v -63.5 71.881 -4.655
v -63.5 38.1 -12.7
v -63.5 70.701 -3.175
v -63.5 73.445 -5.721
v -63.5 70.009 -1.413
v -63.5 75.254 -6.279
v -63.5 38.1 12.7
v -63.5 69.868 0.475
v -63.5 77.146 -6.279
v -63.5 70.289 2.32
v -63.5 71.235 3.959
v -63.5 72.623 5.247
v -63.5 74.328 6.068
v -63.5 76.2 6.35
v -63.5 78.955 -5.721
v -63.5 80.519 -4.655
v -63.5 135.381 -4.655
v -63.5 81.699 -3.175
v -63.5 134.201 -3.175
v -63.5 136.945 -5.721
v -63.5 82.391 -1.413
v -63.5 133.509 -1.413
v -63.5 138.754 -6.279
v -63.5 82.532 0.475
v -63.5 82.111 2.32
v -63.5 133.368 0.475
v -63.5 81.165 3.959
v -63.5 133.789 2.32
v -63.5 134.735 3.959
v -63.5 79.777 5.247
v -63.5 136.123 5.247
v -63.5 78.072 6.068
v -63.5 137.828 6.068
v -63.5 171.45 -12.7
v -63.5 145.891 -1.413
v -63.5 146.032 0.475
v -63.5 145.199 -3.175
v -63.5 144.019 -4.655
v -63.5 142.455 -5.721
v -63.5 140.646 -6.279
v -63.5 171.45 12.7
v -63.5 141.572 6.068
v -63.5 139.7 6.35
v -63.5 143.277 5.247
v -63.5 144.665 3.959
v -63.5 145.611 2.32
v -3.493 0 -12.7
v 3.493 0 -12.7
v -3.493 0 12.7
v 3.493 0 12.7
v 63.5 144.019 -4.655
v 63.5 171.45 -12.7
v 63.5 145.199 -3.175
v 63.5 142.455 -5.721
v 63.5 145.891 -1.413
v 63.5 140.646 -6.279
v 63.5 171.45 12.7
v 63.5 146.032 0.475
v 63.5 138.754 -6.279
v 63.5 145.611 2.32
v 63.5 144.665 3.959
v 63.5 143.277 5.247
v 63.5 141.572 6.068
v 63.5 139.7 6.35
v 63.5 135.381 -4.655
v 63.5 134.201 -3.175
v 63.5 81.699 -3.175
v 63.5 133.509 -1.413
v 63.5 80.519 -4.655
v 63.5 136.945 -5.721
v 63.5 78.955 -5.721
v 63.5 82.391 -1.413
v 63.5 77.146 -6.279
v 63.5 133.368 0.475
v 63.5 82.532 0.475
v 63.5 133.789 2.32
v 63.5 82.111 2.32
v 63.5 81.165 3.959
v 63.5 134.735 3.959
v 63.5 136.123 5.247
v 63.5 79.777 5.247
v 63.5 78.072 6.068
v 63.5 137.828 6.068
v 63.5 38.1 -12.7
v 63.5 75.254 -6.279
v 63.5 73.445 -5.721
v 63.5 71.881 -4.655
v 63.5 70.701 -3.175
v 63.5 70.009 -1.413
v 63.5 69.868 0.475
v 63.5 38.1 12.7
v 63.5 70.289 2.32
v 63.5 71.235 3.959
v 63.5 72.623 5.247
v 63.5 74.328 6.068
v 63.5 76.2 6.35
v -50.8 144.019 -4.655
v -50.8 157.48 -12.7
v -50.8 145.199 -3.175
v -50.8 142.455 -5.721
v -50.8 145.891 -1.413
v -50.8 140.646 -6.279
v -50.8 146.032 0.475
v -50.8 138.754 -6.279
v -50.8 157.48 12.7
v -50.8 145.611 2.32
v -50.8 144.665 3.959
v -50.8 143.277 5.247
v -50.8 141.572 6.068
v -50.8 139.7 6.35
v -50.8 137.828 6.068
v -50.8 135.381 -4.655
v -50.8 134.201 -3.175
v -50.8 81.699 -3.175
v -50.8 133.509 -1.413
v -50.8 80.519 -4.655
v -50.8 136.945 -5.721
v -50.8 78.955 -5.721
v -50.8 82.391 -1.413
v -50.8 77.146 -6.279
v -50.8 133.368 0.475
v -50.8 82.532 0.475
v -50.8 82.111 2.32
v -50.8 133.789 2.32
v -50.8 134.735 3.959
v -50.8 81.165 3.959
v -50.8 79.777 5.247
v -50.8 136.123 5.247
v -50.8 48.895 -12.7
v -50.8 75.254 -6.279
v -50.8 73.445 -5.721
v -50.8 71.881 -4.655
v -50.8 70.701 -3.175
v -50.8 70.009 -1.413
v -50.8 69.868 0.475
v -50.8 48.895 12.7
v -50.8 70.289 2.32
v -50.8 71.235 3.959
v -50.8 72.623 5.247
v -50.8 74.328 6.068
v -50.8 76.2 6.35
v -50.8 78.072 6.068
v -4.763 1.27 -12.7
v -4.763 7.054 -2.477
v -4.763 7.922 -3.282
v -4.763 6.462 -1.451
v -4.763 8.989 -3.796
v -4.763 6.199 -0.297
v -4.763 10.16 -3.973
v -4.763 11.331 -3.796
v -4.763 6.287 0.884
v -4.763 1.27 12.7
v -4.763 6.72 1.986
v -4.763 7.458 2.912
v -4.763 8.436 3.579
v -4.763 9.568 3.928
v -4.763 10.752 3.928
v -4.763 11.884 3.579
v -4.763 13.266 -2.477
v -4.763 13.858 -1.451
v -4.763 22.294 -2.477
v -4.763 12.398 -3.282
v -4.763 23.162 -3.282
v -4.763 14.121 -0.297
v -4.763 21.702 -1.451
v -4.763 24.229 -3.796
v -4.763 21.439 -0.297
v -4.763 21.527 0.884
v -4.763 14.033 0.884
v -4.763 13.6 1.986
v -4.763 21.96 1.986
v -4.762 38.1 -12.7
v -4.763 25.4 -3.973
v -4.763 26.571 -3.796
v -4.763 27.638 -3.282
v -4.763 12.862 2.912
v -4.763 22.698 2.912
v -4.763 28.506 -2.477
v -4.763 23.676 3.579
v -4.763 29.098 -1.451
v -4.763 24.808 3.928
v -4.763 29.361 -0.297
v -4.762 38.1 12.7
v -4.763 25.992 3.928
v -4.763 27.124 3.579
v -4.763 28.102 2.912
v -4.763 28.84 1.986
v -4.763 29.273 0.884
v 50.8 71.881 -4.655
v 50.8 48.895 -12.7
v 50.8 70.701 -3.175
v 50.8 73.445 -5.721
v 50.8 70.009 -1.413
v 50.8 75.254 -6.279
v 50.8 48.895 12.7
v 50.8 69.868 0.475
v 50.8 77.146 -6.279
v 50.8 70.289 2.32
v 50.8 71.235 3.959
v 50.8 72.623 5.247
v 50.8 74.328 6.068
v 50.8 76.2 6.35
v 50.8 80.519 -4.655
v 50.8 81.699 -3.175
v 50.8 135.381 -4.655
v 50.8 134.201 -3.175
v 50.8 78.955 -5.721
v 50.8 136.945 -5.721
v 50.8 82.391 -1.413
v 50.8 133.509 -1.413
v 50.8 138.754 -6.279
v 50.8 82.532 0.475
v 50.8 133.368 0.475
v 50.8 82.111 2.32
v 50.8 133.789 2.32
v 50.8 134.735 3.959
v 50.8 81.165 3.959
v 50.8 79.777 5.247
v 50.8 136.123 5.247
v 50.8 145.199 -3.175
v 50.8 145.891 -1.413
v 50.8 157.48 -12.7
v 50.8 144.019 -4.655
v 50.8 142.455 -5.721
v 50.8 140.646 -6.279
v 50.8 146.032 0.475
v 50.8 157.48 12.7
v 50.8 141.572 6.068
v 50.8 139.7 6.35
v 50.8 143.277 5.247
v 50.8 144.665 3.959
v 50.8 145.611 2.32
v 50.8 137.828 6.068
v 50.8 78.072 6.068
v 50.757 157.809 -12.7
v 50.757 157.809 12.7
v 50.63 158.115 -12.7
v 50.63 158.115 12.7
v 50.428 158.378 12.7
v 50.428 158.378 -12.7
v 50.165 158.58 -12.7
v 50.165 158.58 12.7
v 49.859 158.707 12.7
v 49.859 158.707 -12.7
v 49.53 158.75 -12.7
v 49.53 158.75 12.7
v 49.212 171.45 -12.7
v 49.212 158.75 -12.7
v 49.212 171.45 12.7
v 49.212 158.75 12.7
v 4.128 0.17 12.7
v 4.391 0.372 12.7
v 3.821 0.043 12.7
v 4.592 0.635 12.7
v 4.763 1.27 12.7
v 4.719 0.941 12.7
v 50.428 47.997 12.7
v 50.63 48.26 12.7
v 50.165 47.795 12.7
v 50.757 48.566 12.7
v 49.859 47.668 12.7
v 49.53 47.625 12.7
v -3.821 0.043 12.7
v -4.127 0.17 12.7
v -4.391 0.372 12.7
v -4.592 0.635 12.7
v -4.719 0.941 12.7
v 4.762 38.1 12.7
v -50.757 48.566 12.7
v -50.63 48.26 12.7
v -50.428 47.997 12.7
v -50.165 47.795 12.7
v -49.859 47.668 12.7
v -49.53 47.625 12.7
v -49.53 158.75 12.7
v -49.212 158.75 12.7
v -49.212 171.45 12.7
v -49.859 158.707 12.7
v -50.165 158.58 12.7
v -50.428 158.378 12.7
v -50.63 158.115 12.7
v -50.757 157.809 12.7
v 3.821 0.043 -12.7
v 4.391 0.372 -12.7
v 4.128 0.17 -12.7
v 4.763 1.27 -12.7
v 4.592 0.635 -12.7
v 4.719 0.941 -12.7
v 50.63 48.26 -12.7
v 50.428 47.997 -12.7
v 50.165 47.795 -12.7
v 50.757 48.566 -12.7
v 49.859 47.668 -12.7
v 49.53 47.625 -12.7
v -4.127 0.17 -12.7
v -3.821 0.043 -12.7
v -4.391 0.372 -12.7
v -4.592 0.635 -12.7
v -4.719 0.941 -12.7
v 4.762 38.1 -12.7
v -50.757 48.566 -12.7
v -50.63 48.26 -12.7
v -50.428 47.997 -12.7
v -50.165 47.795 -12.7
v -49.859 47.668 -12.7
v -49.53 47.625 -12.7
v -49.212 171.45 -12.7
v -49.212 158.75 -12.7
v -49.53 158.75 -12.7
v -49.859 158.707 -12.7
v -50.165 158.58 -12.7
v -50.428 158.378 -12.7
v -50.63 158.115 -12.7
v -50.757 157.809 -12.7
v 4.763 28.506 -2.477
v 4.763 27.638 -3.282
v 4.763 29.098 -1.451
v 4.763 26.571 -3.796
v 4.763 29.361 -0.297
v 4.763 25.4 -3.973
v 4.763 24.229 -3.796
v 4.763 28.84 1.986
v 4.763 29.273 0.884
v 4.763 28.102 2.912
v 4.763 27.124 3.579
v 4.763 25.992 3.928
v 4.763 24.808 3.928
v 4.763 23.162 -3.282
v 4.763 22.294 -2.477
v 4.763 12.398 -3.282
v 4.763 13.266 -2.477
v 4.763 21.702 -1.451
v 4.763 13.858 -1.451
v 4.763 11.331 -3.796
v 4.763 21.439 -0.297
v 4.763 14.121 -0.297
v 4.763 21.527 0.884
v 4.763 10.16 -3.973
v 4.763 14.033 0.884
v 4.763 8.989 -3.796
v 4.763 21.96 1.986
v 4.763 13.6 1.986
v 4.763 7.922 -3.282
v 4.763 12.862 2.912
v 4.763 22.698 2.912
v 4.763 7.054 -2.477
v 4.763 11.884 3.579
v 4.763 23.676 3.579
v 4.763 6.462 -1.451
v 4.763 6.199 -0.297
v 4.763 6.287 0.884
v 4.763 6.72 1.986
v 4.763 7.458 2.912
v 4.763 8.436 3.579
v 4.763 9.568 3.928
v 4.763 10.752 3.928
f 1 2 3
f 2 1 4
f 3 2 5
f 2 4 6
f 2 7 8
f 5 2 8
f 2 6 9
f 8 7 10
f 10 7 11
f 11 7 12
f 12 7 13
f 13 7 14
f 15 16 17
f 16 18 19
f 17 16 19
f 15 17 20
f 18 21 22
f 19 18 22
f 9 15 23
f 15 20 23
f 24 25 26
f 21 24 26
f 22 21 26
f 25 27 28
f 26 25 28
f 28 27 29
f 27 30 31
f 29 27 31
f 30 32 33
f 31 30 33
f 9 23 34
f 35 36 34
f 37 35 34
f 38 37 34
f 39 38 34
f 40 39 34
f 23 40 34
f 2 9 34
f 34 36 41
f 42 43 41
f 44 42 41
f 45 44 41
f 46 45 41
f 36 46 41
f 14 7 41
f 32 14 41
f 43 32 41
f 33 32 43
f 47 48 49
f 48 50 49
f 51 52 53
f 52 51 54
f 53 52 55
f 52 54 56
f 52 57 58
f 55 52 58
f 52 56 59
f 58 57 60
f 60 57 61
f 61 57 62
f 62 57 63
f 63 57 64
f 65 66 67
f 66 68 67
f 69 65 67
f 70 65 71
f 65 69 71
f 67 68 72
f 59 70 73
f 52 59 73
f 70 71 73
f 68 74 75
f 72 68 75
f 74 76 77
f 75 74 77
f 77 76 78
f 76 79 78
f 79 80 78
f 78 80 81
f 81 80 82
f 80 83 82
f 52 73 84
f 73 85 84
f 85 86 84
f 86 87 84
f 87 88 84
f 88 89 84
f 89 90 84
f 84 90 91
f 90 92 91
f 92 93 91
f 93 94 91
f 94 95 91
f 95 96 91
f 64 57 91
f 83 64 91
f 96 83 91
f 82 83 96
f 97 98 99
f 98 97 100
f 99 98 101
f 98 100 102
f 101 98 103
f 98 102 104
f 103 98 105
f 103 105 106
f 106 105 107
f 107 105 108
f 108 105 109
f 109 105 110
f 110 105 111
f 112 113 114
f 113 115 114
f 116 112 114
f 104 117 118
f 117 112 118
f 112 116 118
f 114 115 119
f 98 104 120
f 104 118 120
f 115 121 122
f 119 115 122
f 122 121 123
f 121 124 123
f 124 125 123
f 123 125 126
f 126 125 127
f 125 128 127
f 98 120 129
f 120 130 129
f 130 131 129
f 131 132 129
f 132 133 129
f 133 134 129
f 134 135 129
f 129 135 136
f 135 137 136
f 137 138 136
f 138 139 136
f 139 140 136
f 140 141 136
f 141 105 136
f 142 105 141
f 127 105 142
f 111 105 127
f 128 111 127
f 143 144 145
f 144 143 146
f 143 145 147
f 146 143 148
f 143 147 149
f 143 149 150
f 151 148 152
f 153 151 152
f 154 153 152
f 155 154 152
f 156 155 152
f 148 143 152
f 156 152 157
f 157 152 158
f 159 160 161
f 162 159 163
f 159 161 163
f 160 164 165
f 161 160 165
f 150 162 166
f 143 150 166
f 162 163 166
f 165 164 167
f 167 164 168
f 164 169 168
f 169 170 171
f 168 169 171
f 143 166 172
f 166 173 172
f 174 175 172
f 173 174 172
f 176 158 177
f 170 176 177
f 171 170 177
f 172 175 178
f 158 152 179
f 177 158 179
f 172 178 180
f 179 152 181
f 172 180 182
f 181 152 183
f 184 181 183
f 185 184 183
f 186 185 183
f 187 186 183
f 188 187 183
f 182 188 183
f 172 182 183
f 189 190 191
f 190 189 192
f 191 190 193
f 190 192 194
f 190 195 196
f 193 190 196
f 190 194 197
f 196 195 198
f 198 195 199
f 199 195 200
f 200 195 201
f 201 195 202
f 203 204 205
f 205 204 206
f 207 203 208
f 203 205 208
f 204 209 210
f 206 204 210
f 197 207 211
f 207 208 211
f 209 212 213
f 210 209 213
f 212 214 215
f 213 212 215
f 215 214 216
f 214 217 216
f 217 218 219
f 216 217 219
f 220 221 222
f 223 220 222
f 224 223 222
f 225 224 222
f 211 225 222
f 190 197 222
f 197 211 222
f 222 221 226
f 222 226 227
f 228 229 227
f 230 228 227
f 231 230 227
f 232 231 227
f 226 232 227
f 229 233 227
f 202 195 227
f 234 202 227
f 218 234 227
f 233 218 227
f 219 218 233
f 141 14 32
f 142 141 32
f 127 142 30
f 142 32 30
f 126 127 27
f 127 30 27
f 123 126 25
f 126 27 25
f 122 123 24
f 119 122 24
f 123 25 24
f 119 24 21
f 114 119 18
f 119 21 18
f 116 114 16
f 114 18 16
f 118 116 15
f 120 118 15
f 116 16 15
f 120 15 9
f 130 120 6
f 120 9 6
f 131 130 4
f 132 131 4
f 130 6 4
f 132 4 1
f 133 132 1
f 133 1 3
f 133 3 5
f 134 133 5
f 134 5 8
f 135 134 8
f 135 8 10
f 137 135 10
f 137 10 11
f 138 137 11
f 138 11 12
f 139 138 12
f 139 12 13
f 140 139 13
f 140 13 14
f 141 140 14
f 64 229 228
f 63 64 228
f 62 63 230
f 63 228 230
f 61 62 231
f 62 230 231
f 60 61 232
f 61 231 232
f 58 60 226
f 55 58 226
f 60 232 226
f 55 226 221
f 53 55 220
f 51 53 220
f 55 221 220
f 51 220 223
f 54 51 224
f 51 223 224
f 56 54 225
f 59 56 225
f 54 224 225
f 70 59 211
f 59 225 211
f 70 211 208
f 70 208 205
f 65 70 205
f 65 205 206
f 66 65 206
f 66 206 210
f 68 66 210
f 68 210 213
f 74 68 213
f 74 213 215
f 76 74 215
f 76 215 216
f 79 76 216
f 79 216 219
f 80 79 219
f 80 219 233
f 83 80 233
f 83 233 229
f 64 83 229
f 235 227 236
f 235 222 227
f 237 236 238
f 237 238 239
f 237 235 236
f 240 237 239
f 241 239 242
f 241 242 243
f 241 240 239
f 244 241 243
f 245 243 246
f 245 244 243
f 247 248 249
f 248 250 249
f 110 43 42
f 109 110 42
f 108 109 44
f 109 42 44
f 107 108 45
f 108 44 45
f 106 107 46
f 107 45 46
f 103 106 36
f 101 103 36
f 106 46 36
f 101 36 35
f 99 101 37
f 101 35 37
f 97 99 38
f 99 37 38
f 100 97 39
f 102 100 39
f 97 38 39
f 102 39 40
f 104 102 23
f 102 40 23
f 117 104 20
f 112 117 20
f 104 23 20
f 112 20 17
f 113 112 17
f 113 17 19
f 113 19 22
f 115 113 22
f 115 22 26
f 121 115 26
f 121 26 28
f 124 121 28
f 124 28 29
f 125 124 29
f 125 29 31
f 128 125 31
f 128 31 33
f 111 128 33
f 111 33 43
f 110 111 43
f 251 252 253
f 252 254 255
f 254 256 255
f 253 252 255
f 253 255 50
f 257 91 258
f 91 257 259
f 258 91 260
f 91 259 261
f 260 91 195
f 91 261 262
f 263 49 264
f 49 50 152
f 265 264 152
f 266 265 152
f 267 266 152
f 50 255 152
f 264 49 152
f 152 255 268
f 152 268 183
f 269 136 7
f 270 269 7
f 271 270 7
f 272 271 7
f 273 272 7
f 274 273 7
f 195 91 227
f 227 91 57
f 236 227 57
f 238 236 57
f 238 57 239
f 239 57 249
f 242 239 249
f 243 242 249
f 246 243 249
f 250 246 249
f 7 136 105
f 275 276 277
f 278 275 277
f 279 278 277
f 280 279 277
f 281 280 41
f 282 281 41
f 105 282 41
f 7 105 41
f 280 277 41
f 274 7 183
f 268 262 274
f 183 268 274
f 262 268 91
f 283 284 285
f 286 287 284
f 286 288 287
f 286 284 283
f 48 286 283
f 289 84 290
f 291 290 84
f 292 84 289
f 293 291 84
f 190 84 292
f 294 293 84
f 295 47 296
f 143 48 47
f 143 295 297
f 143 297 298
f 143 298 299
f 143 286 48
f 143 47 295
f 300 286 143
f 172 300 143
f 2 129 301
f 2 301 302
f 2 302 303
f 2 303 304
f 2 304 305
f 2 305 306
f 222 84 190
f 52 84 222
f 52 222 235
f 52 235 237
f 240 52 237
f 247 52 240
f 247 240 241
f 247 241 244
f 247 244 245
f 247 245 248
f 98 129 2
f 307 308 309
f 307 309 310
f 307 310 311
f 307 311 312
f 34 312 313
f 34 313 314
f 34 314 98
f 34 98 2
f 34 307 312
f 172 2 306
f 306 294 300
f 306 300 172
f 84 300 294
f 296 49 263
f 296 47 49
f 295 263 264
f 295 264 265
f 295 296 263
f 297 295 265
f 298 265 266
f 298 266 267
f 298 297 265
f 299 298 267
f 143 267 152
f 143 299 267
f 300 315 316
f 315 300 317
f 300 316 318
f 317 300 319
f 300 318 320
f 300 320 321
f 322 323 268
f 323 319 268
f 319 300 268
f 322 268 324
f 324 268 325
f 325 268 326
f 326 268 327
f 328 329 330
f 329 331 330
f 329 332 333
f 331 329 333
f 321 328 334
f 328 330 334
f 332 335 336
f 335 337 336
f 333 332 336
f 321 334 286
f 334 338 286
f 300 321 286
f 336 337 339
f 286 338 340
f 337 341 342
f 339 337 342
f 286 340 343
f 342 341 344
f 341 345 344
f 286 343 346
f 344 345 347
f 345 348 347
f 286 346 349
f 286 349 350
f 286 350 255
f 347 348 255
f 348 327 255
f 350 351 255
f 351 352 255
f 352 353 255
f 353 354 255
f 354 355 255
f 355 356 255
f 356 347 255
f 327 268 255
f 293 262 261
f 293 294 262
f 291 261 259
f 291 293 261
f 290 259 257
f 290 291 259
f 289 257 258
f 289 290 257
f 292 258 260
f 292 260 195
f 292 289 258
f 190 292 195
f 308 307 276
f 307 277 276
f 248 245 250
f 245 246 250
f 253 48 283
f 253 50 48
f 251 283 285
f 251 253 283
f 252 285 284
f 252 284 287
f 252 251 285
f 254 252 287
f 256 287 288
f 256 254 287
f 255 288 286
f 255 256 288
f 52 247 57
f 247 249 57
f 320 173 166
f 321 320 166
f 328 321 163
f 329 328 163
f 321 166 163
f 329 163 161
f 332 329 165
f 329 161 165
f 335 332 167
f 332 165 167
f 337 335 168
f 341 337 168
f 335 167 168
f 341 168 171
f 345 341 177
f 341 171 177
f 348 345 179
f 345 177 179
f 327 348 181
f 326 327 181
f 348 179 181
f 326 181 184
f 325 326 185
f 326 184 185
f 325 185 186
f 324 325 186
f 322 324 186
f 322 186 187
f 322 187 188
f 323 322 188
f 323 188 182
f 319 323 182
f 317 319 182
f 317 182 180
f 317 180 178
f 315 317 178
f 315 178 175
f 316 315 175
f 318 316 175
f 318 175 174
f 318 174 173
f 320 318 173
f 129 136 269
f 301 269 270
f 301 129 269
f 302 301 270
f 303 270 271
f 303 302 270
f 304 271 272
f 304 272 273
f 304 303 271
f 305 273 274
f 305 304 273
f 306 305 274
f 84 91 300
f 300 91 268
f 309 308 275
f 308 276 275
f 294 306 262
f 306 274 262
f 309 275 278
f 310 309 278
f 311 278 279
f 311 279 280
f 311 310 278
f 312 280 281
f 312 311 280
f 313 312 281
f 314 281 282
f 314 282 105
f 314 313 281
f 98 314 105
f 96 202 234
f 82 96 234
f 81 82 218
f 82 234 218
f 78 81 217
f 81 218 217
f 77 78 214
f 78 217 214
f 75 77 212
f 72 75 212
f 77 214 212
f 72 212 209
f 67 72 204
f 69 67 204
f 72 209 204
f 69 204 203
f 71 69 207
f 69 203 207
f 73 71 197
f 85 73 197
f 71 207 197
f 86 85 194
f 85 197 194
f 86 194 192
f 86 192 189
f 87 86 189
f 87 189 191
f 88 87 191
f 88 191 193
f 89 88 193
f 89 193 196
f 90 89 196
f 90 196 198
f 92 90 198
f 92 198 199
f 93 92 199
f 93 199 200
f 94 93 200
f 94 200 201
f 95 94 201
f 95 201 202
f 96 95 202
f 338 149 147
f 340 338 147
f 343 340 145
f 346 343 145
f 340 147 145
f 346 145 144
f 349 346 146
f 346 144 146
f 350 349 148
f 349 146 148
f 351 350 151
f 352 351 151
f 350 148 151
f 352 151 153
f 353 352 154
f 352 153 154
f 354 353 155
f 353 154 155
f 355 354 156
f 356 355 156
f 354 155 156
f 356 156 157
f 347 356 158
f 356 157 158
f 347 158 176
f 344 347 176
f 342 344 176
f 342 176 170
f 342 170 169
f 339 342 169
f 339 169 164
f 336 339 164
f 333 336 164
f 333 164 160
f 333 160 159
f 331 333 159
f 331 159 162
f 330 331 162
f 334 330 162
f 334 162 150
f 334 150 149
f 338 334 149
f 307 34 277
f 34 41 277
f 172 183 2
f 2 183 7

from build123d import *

# Parameters (mm, degrees)
BOSS_EXTRUDE1_DEPTH = 12.7
SKETCH2_R           = 6.35
CUT_EXTRUDE1_DEPTH  = 128
FILLET1_R           = 1.27
HOLE1_D             = 7.94512
HOLE1_DEPTH         = 68.2625
HOLE1_TIP           = 2.386954861


with BuildPart() as part:
    # Sketch1 → Boss-Extrude1 (new body, symmetric)
    with BuildSketch(Plane.XY):
        Polygon((4.7625, 0), (-4.7625, 0), (-4.7625, 38.1), (-63.5, 38.1), (-63.5, 171.45), (-49.2125, 171.45), (-49.2125, 158.75), (-50.8, 158.75), (-50.8, 47.625), (50.8, 47.625), (50.8, 158.75), (49.2125, 158.75), (49.2125, 171.45), (63.5, 171.45), (63.5, 38.1), (4.7625, 38.1), align=None)
    extrude(amount=BOSS_EXTRUDE1_DEPTH, both=True)

    # Sketch2 → Cut-Extrude1 (cut, through all)
    with BuildSketch(Plane.ZY.offset(63.5)):
        with Locations((0, 76.2)):
            Circle(SKETCH2_R)
        with Locations((0, 139.7)):
            Circle(SKETCH2_R)
    extrude(amount=-CUT_EXTRUDE1_DEPTH, mode=Mode.SUBTRACT)

    # Fillet1
    fillet1_edges = [part.edges().sort_by_distance(p)[0] for p in [
        (4.7625, 0, 0),
        (-4.7625, 0, 0),
        (-50.8, 158.75, 0),
        (-50.8, 47.625, 0),
        (50.8, 47.625, 0),
        (50.8, 158.75, 0),
    ]]
    fillet(fillet1_edges, radius=FILLET1_R)

    # Hole1
    with Locations(Plane(origin=(4.7625, 0, 0), x_dir=(0, 0, 1), z_dir=(1, 0, 0))):
        with Locations((0, -25.4), (0, -10.16)):
            Hole(HOLE1_D / 2, depth=HOLE1_DEPTH)
            with Locations((0, 0, -(HOLE1_DEPTH + HOLE1_TIP / 2))):  # 118° drill point
                Cone(0, HOLE1_D / 2, HOLE1_TIP, mode=Mode.SUBTRACT)


solid = part.part
